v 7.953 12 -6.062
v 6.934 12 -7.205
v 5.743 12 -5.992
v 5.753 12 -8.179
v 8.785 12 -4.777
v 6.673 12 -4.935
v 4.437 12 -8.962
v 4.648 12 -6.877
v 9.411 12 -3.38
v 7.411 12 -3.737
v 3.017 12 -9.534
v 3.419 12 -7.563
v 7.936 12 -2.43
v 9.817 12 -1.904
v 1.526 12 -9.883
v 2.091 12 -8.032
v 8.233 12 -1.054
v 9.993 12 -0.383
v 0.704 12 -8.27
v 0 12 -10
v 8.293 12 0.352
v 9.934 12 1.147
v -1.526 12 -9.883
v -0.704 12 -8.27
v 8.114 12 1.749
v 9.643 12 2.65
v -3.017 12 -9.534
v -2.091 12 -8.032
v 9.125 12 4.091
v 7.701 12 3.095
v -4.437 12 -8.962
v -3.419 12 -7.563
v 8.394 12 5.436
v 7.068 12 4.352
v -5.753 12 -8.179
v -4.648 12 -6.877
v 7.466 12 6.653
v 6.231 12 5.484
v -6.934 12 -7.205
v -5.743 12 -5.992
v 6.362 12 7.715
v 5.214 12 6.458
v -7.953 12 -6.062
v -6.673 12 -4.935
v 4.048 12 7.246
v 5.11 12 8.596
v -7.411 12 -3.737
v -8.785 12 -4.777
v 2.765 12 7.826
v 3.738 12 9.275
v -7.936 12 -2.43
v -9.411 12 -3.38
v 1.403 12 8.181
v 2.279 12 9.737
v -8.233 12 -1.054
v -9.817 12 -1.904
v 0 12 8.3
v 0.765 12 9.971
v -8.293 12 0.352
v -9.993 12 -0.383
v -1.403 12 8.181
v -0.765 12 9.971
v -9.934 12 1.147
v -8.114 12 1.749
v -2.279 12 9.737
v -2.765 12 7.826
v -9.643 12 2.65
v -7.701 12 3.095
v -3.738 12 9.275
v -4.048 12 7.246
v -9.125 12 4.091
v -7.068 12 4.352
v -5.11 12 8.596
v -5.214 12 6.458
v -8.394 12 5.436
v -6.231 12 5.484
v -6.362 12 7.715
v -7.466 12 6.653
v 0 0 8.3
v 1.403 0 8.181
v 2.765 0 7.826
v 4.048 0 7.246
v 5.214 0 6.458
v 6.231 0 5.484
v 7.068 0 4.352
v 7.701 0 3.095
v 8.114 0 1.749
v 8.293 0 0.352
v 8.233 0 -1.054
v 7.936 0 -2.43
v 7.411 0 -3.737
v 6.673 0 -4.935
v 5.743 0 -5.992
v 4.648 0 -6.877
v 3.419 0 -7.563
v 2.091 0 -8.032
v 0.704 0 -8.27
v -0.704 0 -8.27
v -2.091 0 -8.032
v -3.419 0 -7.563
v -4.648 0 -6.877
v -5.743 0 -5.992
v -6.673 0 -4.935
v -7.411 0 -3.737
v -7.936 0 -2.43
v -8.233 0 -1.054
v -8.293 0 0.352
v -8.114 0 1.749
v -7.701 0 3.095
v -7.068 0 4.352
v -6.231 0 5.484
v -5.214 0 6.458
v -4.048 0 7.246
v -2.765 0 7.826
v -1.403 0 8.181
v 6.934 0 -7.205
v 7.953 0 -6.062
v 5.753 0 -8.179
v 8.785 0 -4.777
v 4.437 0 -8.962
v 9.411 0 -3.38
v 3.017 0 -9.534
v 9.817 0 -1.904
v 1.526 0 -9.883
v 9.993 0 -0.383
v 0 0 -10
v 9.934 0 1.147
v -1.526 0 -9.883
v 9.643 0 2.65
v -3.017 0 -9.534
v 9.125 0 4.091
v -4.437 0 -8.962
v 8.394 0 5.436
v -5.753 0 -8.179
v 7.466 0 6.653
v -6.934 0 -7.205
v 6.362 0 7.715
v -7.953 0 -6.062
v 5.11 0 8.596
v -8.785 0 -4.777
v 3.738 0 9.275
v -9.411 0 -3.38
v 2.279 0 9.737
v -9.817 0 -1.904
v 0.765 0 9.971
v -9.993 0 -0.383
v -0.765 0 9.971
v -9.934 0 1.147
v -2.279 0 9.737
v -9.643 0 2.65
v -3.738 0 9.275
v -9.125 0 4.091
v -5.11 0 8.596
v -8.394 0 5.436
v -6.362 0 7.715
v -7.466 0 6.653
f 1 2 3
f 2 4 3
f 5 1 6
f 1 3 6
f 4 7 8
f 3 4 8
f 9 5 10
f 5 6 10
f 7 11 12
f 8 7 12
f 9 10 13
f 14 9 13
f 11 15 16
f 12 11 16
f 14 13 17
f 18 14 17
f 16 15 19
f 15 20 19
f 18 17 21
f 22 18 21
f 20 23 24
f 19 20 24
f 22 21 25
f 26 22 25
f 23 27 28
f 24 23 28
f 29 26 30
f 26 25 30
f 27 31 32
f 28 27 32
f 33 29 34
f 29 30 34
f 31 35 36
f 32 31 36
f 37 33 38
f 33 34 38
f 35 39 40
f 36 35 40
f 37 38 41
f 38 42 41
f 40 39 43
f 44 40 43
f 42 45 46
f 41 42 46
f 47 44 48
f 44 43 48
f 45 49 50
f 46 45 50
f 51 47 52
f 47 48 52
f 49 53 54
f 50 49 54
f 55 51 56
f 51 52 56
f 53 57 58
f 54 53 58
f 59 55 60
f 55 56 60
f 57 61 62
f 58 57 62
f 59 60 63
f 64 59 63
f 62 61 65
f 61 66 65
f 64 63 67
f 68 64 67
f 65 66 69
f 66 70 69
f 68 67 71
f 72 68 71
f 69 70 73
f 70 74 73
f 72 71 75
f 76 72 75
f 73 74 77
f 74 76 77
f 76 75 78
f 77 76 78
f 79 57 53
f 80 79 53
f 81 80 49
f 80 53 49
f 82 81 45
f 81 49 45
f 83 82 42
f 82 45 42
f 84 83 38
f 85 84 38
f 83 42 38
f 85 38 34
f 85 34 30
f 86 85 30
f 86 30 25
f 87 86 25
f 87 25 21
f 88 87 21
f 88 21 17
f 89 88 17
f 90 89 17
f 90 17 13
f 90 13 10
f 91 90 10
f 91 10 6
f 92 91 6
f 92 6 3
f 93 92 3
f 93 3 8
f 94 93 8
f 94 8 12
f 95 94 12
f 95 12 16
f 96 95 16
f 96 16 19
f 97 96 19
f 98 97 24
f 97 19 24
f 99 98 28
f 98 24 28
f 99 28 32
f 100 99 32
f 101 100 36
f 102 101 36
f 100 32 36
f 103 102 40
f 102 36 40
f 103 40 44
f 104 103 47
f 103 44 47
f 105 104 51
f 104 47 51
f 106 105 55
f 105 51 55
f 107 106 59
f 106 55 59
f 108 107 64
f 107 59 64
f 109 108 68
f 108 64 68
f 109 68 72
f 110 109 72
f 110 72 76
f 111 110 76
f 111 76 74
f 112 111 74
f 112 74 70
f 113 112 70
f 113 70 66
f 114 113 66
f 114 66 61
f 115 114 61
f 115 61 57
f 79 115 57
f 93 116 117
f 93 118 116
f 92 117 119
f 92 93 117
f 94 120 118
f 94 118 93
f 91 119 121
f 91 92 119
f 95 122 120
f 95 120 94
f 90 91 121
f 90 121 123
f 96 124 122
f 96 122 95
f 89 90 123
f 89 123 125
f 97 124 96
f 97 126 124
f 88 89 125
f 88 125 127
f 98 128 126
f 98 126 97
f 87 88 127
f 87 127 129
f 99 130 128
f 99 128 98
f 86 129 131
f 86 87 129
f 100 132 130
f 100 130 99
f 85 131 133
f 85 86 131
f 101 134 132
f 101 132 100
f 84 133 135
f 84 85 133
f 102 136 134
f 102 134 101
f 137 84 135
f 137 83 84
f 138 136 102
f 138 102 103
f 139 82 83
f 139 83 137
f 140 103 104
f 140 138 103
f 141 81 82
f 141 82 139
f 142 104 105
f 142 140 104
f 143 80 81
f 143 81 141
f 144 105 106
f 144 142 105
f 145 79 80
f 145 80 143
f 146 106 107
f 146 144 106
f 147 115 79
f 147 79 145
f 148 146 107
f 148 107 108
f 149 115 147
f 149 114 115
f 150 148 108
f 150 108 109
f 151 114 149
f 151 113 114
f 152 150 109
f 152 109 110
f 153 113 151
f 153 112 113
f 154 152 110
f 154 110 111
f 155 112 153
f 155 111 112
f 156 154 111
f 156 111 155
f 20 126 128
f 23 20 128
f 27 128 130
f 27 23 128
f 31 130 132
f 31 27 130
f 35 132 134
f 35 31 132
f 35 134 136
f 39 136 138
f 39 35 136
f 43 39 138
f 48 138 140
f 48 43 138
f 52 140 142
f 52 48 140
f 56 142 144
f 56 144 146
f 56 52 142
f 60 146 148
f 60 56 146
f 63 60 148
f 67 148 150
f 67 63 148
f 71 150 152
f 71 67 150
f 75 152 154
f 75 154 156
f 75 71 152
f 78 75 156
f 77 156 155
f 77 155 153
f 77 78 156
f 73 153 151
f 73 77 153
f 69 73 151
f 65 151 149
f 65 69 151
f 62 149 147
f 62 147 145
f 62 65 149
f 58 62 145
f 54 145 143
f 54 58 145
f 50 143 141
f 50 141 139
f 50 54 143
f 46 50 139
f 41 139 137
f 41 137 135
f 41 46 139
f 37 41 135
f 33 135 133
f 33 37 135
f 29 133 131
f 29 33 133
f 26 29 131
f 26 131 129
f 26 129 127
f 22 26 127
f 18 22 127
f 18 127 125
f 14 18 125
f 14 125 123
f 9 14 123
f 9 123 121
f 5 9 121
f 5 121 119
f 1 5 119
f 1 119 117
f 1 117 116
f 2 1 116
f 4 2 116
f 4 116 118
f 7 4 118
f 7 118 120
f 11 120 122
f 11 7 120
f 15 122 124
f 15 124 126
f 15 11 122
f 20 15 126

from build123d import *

# Parameters (mm, degrees)
SKETCH_1_W          = 10
SKETCH_1_H          = 12
SKETCH_2_R          = 4.3
AXIAL_BORE_DEPTH    = 19.547236991
SKETCH_3_R          = 8.3
D16_CLEARANCE_DEPTH = 19.547236991


with BuildPart() as part:
    # 草图1 → Round_pushrod_head (revolve)
    with BuildSketch(Plane.XY, mode=Mode.PRIVATE) as round_pushrod_head_sk:
        with Locations((5, 6)):
            Rectangle(SKETCH_1_W, SKETCH_1_H)
    revolve(round_pushrod_head_sk.sketch.rotate(Axis((0, 0, 0), (0, 1, 0)), 90), axis=Axis((0, 0, 0), (0, 1, 0)))

    # 草图2 → Axial_bore (cut, through all)
    with BuildSketch(Plane(origin=(0, 12, 0), x_dir=(1, 0, 0), z_dir=(0, 1, 0))):
        with Locations(Location((0, 0, 0), (0, 0, 270))):
            Circle(SKETCH_2_R)
    extrude(amount=-AXIAL_BORE_DEPTH, mode=Mode.SUBTRACT)

    # 草图3 → D16_clearance (cut, through all)
    with BuildSketch(Plane(origin=(0, 12, 0), x_dir=(1, 0, 0), z_dir=(0, 1, 0))):
        with Locations(Location((0, 0, 0), (0, 0, 270))):
            Circle(SKETCH_3_R)
    extrude(amount=-D16_CLEARANCE_DEPTH, mode=Mode.SUBTRACT)


solid = part.part
